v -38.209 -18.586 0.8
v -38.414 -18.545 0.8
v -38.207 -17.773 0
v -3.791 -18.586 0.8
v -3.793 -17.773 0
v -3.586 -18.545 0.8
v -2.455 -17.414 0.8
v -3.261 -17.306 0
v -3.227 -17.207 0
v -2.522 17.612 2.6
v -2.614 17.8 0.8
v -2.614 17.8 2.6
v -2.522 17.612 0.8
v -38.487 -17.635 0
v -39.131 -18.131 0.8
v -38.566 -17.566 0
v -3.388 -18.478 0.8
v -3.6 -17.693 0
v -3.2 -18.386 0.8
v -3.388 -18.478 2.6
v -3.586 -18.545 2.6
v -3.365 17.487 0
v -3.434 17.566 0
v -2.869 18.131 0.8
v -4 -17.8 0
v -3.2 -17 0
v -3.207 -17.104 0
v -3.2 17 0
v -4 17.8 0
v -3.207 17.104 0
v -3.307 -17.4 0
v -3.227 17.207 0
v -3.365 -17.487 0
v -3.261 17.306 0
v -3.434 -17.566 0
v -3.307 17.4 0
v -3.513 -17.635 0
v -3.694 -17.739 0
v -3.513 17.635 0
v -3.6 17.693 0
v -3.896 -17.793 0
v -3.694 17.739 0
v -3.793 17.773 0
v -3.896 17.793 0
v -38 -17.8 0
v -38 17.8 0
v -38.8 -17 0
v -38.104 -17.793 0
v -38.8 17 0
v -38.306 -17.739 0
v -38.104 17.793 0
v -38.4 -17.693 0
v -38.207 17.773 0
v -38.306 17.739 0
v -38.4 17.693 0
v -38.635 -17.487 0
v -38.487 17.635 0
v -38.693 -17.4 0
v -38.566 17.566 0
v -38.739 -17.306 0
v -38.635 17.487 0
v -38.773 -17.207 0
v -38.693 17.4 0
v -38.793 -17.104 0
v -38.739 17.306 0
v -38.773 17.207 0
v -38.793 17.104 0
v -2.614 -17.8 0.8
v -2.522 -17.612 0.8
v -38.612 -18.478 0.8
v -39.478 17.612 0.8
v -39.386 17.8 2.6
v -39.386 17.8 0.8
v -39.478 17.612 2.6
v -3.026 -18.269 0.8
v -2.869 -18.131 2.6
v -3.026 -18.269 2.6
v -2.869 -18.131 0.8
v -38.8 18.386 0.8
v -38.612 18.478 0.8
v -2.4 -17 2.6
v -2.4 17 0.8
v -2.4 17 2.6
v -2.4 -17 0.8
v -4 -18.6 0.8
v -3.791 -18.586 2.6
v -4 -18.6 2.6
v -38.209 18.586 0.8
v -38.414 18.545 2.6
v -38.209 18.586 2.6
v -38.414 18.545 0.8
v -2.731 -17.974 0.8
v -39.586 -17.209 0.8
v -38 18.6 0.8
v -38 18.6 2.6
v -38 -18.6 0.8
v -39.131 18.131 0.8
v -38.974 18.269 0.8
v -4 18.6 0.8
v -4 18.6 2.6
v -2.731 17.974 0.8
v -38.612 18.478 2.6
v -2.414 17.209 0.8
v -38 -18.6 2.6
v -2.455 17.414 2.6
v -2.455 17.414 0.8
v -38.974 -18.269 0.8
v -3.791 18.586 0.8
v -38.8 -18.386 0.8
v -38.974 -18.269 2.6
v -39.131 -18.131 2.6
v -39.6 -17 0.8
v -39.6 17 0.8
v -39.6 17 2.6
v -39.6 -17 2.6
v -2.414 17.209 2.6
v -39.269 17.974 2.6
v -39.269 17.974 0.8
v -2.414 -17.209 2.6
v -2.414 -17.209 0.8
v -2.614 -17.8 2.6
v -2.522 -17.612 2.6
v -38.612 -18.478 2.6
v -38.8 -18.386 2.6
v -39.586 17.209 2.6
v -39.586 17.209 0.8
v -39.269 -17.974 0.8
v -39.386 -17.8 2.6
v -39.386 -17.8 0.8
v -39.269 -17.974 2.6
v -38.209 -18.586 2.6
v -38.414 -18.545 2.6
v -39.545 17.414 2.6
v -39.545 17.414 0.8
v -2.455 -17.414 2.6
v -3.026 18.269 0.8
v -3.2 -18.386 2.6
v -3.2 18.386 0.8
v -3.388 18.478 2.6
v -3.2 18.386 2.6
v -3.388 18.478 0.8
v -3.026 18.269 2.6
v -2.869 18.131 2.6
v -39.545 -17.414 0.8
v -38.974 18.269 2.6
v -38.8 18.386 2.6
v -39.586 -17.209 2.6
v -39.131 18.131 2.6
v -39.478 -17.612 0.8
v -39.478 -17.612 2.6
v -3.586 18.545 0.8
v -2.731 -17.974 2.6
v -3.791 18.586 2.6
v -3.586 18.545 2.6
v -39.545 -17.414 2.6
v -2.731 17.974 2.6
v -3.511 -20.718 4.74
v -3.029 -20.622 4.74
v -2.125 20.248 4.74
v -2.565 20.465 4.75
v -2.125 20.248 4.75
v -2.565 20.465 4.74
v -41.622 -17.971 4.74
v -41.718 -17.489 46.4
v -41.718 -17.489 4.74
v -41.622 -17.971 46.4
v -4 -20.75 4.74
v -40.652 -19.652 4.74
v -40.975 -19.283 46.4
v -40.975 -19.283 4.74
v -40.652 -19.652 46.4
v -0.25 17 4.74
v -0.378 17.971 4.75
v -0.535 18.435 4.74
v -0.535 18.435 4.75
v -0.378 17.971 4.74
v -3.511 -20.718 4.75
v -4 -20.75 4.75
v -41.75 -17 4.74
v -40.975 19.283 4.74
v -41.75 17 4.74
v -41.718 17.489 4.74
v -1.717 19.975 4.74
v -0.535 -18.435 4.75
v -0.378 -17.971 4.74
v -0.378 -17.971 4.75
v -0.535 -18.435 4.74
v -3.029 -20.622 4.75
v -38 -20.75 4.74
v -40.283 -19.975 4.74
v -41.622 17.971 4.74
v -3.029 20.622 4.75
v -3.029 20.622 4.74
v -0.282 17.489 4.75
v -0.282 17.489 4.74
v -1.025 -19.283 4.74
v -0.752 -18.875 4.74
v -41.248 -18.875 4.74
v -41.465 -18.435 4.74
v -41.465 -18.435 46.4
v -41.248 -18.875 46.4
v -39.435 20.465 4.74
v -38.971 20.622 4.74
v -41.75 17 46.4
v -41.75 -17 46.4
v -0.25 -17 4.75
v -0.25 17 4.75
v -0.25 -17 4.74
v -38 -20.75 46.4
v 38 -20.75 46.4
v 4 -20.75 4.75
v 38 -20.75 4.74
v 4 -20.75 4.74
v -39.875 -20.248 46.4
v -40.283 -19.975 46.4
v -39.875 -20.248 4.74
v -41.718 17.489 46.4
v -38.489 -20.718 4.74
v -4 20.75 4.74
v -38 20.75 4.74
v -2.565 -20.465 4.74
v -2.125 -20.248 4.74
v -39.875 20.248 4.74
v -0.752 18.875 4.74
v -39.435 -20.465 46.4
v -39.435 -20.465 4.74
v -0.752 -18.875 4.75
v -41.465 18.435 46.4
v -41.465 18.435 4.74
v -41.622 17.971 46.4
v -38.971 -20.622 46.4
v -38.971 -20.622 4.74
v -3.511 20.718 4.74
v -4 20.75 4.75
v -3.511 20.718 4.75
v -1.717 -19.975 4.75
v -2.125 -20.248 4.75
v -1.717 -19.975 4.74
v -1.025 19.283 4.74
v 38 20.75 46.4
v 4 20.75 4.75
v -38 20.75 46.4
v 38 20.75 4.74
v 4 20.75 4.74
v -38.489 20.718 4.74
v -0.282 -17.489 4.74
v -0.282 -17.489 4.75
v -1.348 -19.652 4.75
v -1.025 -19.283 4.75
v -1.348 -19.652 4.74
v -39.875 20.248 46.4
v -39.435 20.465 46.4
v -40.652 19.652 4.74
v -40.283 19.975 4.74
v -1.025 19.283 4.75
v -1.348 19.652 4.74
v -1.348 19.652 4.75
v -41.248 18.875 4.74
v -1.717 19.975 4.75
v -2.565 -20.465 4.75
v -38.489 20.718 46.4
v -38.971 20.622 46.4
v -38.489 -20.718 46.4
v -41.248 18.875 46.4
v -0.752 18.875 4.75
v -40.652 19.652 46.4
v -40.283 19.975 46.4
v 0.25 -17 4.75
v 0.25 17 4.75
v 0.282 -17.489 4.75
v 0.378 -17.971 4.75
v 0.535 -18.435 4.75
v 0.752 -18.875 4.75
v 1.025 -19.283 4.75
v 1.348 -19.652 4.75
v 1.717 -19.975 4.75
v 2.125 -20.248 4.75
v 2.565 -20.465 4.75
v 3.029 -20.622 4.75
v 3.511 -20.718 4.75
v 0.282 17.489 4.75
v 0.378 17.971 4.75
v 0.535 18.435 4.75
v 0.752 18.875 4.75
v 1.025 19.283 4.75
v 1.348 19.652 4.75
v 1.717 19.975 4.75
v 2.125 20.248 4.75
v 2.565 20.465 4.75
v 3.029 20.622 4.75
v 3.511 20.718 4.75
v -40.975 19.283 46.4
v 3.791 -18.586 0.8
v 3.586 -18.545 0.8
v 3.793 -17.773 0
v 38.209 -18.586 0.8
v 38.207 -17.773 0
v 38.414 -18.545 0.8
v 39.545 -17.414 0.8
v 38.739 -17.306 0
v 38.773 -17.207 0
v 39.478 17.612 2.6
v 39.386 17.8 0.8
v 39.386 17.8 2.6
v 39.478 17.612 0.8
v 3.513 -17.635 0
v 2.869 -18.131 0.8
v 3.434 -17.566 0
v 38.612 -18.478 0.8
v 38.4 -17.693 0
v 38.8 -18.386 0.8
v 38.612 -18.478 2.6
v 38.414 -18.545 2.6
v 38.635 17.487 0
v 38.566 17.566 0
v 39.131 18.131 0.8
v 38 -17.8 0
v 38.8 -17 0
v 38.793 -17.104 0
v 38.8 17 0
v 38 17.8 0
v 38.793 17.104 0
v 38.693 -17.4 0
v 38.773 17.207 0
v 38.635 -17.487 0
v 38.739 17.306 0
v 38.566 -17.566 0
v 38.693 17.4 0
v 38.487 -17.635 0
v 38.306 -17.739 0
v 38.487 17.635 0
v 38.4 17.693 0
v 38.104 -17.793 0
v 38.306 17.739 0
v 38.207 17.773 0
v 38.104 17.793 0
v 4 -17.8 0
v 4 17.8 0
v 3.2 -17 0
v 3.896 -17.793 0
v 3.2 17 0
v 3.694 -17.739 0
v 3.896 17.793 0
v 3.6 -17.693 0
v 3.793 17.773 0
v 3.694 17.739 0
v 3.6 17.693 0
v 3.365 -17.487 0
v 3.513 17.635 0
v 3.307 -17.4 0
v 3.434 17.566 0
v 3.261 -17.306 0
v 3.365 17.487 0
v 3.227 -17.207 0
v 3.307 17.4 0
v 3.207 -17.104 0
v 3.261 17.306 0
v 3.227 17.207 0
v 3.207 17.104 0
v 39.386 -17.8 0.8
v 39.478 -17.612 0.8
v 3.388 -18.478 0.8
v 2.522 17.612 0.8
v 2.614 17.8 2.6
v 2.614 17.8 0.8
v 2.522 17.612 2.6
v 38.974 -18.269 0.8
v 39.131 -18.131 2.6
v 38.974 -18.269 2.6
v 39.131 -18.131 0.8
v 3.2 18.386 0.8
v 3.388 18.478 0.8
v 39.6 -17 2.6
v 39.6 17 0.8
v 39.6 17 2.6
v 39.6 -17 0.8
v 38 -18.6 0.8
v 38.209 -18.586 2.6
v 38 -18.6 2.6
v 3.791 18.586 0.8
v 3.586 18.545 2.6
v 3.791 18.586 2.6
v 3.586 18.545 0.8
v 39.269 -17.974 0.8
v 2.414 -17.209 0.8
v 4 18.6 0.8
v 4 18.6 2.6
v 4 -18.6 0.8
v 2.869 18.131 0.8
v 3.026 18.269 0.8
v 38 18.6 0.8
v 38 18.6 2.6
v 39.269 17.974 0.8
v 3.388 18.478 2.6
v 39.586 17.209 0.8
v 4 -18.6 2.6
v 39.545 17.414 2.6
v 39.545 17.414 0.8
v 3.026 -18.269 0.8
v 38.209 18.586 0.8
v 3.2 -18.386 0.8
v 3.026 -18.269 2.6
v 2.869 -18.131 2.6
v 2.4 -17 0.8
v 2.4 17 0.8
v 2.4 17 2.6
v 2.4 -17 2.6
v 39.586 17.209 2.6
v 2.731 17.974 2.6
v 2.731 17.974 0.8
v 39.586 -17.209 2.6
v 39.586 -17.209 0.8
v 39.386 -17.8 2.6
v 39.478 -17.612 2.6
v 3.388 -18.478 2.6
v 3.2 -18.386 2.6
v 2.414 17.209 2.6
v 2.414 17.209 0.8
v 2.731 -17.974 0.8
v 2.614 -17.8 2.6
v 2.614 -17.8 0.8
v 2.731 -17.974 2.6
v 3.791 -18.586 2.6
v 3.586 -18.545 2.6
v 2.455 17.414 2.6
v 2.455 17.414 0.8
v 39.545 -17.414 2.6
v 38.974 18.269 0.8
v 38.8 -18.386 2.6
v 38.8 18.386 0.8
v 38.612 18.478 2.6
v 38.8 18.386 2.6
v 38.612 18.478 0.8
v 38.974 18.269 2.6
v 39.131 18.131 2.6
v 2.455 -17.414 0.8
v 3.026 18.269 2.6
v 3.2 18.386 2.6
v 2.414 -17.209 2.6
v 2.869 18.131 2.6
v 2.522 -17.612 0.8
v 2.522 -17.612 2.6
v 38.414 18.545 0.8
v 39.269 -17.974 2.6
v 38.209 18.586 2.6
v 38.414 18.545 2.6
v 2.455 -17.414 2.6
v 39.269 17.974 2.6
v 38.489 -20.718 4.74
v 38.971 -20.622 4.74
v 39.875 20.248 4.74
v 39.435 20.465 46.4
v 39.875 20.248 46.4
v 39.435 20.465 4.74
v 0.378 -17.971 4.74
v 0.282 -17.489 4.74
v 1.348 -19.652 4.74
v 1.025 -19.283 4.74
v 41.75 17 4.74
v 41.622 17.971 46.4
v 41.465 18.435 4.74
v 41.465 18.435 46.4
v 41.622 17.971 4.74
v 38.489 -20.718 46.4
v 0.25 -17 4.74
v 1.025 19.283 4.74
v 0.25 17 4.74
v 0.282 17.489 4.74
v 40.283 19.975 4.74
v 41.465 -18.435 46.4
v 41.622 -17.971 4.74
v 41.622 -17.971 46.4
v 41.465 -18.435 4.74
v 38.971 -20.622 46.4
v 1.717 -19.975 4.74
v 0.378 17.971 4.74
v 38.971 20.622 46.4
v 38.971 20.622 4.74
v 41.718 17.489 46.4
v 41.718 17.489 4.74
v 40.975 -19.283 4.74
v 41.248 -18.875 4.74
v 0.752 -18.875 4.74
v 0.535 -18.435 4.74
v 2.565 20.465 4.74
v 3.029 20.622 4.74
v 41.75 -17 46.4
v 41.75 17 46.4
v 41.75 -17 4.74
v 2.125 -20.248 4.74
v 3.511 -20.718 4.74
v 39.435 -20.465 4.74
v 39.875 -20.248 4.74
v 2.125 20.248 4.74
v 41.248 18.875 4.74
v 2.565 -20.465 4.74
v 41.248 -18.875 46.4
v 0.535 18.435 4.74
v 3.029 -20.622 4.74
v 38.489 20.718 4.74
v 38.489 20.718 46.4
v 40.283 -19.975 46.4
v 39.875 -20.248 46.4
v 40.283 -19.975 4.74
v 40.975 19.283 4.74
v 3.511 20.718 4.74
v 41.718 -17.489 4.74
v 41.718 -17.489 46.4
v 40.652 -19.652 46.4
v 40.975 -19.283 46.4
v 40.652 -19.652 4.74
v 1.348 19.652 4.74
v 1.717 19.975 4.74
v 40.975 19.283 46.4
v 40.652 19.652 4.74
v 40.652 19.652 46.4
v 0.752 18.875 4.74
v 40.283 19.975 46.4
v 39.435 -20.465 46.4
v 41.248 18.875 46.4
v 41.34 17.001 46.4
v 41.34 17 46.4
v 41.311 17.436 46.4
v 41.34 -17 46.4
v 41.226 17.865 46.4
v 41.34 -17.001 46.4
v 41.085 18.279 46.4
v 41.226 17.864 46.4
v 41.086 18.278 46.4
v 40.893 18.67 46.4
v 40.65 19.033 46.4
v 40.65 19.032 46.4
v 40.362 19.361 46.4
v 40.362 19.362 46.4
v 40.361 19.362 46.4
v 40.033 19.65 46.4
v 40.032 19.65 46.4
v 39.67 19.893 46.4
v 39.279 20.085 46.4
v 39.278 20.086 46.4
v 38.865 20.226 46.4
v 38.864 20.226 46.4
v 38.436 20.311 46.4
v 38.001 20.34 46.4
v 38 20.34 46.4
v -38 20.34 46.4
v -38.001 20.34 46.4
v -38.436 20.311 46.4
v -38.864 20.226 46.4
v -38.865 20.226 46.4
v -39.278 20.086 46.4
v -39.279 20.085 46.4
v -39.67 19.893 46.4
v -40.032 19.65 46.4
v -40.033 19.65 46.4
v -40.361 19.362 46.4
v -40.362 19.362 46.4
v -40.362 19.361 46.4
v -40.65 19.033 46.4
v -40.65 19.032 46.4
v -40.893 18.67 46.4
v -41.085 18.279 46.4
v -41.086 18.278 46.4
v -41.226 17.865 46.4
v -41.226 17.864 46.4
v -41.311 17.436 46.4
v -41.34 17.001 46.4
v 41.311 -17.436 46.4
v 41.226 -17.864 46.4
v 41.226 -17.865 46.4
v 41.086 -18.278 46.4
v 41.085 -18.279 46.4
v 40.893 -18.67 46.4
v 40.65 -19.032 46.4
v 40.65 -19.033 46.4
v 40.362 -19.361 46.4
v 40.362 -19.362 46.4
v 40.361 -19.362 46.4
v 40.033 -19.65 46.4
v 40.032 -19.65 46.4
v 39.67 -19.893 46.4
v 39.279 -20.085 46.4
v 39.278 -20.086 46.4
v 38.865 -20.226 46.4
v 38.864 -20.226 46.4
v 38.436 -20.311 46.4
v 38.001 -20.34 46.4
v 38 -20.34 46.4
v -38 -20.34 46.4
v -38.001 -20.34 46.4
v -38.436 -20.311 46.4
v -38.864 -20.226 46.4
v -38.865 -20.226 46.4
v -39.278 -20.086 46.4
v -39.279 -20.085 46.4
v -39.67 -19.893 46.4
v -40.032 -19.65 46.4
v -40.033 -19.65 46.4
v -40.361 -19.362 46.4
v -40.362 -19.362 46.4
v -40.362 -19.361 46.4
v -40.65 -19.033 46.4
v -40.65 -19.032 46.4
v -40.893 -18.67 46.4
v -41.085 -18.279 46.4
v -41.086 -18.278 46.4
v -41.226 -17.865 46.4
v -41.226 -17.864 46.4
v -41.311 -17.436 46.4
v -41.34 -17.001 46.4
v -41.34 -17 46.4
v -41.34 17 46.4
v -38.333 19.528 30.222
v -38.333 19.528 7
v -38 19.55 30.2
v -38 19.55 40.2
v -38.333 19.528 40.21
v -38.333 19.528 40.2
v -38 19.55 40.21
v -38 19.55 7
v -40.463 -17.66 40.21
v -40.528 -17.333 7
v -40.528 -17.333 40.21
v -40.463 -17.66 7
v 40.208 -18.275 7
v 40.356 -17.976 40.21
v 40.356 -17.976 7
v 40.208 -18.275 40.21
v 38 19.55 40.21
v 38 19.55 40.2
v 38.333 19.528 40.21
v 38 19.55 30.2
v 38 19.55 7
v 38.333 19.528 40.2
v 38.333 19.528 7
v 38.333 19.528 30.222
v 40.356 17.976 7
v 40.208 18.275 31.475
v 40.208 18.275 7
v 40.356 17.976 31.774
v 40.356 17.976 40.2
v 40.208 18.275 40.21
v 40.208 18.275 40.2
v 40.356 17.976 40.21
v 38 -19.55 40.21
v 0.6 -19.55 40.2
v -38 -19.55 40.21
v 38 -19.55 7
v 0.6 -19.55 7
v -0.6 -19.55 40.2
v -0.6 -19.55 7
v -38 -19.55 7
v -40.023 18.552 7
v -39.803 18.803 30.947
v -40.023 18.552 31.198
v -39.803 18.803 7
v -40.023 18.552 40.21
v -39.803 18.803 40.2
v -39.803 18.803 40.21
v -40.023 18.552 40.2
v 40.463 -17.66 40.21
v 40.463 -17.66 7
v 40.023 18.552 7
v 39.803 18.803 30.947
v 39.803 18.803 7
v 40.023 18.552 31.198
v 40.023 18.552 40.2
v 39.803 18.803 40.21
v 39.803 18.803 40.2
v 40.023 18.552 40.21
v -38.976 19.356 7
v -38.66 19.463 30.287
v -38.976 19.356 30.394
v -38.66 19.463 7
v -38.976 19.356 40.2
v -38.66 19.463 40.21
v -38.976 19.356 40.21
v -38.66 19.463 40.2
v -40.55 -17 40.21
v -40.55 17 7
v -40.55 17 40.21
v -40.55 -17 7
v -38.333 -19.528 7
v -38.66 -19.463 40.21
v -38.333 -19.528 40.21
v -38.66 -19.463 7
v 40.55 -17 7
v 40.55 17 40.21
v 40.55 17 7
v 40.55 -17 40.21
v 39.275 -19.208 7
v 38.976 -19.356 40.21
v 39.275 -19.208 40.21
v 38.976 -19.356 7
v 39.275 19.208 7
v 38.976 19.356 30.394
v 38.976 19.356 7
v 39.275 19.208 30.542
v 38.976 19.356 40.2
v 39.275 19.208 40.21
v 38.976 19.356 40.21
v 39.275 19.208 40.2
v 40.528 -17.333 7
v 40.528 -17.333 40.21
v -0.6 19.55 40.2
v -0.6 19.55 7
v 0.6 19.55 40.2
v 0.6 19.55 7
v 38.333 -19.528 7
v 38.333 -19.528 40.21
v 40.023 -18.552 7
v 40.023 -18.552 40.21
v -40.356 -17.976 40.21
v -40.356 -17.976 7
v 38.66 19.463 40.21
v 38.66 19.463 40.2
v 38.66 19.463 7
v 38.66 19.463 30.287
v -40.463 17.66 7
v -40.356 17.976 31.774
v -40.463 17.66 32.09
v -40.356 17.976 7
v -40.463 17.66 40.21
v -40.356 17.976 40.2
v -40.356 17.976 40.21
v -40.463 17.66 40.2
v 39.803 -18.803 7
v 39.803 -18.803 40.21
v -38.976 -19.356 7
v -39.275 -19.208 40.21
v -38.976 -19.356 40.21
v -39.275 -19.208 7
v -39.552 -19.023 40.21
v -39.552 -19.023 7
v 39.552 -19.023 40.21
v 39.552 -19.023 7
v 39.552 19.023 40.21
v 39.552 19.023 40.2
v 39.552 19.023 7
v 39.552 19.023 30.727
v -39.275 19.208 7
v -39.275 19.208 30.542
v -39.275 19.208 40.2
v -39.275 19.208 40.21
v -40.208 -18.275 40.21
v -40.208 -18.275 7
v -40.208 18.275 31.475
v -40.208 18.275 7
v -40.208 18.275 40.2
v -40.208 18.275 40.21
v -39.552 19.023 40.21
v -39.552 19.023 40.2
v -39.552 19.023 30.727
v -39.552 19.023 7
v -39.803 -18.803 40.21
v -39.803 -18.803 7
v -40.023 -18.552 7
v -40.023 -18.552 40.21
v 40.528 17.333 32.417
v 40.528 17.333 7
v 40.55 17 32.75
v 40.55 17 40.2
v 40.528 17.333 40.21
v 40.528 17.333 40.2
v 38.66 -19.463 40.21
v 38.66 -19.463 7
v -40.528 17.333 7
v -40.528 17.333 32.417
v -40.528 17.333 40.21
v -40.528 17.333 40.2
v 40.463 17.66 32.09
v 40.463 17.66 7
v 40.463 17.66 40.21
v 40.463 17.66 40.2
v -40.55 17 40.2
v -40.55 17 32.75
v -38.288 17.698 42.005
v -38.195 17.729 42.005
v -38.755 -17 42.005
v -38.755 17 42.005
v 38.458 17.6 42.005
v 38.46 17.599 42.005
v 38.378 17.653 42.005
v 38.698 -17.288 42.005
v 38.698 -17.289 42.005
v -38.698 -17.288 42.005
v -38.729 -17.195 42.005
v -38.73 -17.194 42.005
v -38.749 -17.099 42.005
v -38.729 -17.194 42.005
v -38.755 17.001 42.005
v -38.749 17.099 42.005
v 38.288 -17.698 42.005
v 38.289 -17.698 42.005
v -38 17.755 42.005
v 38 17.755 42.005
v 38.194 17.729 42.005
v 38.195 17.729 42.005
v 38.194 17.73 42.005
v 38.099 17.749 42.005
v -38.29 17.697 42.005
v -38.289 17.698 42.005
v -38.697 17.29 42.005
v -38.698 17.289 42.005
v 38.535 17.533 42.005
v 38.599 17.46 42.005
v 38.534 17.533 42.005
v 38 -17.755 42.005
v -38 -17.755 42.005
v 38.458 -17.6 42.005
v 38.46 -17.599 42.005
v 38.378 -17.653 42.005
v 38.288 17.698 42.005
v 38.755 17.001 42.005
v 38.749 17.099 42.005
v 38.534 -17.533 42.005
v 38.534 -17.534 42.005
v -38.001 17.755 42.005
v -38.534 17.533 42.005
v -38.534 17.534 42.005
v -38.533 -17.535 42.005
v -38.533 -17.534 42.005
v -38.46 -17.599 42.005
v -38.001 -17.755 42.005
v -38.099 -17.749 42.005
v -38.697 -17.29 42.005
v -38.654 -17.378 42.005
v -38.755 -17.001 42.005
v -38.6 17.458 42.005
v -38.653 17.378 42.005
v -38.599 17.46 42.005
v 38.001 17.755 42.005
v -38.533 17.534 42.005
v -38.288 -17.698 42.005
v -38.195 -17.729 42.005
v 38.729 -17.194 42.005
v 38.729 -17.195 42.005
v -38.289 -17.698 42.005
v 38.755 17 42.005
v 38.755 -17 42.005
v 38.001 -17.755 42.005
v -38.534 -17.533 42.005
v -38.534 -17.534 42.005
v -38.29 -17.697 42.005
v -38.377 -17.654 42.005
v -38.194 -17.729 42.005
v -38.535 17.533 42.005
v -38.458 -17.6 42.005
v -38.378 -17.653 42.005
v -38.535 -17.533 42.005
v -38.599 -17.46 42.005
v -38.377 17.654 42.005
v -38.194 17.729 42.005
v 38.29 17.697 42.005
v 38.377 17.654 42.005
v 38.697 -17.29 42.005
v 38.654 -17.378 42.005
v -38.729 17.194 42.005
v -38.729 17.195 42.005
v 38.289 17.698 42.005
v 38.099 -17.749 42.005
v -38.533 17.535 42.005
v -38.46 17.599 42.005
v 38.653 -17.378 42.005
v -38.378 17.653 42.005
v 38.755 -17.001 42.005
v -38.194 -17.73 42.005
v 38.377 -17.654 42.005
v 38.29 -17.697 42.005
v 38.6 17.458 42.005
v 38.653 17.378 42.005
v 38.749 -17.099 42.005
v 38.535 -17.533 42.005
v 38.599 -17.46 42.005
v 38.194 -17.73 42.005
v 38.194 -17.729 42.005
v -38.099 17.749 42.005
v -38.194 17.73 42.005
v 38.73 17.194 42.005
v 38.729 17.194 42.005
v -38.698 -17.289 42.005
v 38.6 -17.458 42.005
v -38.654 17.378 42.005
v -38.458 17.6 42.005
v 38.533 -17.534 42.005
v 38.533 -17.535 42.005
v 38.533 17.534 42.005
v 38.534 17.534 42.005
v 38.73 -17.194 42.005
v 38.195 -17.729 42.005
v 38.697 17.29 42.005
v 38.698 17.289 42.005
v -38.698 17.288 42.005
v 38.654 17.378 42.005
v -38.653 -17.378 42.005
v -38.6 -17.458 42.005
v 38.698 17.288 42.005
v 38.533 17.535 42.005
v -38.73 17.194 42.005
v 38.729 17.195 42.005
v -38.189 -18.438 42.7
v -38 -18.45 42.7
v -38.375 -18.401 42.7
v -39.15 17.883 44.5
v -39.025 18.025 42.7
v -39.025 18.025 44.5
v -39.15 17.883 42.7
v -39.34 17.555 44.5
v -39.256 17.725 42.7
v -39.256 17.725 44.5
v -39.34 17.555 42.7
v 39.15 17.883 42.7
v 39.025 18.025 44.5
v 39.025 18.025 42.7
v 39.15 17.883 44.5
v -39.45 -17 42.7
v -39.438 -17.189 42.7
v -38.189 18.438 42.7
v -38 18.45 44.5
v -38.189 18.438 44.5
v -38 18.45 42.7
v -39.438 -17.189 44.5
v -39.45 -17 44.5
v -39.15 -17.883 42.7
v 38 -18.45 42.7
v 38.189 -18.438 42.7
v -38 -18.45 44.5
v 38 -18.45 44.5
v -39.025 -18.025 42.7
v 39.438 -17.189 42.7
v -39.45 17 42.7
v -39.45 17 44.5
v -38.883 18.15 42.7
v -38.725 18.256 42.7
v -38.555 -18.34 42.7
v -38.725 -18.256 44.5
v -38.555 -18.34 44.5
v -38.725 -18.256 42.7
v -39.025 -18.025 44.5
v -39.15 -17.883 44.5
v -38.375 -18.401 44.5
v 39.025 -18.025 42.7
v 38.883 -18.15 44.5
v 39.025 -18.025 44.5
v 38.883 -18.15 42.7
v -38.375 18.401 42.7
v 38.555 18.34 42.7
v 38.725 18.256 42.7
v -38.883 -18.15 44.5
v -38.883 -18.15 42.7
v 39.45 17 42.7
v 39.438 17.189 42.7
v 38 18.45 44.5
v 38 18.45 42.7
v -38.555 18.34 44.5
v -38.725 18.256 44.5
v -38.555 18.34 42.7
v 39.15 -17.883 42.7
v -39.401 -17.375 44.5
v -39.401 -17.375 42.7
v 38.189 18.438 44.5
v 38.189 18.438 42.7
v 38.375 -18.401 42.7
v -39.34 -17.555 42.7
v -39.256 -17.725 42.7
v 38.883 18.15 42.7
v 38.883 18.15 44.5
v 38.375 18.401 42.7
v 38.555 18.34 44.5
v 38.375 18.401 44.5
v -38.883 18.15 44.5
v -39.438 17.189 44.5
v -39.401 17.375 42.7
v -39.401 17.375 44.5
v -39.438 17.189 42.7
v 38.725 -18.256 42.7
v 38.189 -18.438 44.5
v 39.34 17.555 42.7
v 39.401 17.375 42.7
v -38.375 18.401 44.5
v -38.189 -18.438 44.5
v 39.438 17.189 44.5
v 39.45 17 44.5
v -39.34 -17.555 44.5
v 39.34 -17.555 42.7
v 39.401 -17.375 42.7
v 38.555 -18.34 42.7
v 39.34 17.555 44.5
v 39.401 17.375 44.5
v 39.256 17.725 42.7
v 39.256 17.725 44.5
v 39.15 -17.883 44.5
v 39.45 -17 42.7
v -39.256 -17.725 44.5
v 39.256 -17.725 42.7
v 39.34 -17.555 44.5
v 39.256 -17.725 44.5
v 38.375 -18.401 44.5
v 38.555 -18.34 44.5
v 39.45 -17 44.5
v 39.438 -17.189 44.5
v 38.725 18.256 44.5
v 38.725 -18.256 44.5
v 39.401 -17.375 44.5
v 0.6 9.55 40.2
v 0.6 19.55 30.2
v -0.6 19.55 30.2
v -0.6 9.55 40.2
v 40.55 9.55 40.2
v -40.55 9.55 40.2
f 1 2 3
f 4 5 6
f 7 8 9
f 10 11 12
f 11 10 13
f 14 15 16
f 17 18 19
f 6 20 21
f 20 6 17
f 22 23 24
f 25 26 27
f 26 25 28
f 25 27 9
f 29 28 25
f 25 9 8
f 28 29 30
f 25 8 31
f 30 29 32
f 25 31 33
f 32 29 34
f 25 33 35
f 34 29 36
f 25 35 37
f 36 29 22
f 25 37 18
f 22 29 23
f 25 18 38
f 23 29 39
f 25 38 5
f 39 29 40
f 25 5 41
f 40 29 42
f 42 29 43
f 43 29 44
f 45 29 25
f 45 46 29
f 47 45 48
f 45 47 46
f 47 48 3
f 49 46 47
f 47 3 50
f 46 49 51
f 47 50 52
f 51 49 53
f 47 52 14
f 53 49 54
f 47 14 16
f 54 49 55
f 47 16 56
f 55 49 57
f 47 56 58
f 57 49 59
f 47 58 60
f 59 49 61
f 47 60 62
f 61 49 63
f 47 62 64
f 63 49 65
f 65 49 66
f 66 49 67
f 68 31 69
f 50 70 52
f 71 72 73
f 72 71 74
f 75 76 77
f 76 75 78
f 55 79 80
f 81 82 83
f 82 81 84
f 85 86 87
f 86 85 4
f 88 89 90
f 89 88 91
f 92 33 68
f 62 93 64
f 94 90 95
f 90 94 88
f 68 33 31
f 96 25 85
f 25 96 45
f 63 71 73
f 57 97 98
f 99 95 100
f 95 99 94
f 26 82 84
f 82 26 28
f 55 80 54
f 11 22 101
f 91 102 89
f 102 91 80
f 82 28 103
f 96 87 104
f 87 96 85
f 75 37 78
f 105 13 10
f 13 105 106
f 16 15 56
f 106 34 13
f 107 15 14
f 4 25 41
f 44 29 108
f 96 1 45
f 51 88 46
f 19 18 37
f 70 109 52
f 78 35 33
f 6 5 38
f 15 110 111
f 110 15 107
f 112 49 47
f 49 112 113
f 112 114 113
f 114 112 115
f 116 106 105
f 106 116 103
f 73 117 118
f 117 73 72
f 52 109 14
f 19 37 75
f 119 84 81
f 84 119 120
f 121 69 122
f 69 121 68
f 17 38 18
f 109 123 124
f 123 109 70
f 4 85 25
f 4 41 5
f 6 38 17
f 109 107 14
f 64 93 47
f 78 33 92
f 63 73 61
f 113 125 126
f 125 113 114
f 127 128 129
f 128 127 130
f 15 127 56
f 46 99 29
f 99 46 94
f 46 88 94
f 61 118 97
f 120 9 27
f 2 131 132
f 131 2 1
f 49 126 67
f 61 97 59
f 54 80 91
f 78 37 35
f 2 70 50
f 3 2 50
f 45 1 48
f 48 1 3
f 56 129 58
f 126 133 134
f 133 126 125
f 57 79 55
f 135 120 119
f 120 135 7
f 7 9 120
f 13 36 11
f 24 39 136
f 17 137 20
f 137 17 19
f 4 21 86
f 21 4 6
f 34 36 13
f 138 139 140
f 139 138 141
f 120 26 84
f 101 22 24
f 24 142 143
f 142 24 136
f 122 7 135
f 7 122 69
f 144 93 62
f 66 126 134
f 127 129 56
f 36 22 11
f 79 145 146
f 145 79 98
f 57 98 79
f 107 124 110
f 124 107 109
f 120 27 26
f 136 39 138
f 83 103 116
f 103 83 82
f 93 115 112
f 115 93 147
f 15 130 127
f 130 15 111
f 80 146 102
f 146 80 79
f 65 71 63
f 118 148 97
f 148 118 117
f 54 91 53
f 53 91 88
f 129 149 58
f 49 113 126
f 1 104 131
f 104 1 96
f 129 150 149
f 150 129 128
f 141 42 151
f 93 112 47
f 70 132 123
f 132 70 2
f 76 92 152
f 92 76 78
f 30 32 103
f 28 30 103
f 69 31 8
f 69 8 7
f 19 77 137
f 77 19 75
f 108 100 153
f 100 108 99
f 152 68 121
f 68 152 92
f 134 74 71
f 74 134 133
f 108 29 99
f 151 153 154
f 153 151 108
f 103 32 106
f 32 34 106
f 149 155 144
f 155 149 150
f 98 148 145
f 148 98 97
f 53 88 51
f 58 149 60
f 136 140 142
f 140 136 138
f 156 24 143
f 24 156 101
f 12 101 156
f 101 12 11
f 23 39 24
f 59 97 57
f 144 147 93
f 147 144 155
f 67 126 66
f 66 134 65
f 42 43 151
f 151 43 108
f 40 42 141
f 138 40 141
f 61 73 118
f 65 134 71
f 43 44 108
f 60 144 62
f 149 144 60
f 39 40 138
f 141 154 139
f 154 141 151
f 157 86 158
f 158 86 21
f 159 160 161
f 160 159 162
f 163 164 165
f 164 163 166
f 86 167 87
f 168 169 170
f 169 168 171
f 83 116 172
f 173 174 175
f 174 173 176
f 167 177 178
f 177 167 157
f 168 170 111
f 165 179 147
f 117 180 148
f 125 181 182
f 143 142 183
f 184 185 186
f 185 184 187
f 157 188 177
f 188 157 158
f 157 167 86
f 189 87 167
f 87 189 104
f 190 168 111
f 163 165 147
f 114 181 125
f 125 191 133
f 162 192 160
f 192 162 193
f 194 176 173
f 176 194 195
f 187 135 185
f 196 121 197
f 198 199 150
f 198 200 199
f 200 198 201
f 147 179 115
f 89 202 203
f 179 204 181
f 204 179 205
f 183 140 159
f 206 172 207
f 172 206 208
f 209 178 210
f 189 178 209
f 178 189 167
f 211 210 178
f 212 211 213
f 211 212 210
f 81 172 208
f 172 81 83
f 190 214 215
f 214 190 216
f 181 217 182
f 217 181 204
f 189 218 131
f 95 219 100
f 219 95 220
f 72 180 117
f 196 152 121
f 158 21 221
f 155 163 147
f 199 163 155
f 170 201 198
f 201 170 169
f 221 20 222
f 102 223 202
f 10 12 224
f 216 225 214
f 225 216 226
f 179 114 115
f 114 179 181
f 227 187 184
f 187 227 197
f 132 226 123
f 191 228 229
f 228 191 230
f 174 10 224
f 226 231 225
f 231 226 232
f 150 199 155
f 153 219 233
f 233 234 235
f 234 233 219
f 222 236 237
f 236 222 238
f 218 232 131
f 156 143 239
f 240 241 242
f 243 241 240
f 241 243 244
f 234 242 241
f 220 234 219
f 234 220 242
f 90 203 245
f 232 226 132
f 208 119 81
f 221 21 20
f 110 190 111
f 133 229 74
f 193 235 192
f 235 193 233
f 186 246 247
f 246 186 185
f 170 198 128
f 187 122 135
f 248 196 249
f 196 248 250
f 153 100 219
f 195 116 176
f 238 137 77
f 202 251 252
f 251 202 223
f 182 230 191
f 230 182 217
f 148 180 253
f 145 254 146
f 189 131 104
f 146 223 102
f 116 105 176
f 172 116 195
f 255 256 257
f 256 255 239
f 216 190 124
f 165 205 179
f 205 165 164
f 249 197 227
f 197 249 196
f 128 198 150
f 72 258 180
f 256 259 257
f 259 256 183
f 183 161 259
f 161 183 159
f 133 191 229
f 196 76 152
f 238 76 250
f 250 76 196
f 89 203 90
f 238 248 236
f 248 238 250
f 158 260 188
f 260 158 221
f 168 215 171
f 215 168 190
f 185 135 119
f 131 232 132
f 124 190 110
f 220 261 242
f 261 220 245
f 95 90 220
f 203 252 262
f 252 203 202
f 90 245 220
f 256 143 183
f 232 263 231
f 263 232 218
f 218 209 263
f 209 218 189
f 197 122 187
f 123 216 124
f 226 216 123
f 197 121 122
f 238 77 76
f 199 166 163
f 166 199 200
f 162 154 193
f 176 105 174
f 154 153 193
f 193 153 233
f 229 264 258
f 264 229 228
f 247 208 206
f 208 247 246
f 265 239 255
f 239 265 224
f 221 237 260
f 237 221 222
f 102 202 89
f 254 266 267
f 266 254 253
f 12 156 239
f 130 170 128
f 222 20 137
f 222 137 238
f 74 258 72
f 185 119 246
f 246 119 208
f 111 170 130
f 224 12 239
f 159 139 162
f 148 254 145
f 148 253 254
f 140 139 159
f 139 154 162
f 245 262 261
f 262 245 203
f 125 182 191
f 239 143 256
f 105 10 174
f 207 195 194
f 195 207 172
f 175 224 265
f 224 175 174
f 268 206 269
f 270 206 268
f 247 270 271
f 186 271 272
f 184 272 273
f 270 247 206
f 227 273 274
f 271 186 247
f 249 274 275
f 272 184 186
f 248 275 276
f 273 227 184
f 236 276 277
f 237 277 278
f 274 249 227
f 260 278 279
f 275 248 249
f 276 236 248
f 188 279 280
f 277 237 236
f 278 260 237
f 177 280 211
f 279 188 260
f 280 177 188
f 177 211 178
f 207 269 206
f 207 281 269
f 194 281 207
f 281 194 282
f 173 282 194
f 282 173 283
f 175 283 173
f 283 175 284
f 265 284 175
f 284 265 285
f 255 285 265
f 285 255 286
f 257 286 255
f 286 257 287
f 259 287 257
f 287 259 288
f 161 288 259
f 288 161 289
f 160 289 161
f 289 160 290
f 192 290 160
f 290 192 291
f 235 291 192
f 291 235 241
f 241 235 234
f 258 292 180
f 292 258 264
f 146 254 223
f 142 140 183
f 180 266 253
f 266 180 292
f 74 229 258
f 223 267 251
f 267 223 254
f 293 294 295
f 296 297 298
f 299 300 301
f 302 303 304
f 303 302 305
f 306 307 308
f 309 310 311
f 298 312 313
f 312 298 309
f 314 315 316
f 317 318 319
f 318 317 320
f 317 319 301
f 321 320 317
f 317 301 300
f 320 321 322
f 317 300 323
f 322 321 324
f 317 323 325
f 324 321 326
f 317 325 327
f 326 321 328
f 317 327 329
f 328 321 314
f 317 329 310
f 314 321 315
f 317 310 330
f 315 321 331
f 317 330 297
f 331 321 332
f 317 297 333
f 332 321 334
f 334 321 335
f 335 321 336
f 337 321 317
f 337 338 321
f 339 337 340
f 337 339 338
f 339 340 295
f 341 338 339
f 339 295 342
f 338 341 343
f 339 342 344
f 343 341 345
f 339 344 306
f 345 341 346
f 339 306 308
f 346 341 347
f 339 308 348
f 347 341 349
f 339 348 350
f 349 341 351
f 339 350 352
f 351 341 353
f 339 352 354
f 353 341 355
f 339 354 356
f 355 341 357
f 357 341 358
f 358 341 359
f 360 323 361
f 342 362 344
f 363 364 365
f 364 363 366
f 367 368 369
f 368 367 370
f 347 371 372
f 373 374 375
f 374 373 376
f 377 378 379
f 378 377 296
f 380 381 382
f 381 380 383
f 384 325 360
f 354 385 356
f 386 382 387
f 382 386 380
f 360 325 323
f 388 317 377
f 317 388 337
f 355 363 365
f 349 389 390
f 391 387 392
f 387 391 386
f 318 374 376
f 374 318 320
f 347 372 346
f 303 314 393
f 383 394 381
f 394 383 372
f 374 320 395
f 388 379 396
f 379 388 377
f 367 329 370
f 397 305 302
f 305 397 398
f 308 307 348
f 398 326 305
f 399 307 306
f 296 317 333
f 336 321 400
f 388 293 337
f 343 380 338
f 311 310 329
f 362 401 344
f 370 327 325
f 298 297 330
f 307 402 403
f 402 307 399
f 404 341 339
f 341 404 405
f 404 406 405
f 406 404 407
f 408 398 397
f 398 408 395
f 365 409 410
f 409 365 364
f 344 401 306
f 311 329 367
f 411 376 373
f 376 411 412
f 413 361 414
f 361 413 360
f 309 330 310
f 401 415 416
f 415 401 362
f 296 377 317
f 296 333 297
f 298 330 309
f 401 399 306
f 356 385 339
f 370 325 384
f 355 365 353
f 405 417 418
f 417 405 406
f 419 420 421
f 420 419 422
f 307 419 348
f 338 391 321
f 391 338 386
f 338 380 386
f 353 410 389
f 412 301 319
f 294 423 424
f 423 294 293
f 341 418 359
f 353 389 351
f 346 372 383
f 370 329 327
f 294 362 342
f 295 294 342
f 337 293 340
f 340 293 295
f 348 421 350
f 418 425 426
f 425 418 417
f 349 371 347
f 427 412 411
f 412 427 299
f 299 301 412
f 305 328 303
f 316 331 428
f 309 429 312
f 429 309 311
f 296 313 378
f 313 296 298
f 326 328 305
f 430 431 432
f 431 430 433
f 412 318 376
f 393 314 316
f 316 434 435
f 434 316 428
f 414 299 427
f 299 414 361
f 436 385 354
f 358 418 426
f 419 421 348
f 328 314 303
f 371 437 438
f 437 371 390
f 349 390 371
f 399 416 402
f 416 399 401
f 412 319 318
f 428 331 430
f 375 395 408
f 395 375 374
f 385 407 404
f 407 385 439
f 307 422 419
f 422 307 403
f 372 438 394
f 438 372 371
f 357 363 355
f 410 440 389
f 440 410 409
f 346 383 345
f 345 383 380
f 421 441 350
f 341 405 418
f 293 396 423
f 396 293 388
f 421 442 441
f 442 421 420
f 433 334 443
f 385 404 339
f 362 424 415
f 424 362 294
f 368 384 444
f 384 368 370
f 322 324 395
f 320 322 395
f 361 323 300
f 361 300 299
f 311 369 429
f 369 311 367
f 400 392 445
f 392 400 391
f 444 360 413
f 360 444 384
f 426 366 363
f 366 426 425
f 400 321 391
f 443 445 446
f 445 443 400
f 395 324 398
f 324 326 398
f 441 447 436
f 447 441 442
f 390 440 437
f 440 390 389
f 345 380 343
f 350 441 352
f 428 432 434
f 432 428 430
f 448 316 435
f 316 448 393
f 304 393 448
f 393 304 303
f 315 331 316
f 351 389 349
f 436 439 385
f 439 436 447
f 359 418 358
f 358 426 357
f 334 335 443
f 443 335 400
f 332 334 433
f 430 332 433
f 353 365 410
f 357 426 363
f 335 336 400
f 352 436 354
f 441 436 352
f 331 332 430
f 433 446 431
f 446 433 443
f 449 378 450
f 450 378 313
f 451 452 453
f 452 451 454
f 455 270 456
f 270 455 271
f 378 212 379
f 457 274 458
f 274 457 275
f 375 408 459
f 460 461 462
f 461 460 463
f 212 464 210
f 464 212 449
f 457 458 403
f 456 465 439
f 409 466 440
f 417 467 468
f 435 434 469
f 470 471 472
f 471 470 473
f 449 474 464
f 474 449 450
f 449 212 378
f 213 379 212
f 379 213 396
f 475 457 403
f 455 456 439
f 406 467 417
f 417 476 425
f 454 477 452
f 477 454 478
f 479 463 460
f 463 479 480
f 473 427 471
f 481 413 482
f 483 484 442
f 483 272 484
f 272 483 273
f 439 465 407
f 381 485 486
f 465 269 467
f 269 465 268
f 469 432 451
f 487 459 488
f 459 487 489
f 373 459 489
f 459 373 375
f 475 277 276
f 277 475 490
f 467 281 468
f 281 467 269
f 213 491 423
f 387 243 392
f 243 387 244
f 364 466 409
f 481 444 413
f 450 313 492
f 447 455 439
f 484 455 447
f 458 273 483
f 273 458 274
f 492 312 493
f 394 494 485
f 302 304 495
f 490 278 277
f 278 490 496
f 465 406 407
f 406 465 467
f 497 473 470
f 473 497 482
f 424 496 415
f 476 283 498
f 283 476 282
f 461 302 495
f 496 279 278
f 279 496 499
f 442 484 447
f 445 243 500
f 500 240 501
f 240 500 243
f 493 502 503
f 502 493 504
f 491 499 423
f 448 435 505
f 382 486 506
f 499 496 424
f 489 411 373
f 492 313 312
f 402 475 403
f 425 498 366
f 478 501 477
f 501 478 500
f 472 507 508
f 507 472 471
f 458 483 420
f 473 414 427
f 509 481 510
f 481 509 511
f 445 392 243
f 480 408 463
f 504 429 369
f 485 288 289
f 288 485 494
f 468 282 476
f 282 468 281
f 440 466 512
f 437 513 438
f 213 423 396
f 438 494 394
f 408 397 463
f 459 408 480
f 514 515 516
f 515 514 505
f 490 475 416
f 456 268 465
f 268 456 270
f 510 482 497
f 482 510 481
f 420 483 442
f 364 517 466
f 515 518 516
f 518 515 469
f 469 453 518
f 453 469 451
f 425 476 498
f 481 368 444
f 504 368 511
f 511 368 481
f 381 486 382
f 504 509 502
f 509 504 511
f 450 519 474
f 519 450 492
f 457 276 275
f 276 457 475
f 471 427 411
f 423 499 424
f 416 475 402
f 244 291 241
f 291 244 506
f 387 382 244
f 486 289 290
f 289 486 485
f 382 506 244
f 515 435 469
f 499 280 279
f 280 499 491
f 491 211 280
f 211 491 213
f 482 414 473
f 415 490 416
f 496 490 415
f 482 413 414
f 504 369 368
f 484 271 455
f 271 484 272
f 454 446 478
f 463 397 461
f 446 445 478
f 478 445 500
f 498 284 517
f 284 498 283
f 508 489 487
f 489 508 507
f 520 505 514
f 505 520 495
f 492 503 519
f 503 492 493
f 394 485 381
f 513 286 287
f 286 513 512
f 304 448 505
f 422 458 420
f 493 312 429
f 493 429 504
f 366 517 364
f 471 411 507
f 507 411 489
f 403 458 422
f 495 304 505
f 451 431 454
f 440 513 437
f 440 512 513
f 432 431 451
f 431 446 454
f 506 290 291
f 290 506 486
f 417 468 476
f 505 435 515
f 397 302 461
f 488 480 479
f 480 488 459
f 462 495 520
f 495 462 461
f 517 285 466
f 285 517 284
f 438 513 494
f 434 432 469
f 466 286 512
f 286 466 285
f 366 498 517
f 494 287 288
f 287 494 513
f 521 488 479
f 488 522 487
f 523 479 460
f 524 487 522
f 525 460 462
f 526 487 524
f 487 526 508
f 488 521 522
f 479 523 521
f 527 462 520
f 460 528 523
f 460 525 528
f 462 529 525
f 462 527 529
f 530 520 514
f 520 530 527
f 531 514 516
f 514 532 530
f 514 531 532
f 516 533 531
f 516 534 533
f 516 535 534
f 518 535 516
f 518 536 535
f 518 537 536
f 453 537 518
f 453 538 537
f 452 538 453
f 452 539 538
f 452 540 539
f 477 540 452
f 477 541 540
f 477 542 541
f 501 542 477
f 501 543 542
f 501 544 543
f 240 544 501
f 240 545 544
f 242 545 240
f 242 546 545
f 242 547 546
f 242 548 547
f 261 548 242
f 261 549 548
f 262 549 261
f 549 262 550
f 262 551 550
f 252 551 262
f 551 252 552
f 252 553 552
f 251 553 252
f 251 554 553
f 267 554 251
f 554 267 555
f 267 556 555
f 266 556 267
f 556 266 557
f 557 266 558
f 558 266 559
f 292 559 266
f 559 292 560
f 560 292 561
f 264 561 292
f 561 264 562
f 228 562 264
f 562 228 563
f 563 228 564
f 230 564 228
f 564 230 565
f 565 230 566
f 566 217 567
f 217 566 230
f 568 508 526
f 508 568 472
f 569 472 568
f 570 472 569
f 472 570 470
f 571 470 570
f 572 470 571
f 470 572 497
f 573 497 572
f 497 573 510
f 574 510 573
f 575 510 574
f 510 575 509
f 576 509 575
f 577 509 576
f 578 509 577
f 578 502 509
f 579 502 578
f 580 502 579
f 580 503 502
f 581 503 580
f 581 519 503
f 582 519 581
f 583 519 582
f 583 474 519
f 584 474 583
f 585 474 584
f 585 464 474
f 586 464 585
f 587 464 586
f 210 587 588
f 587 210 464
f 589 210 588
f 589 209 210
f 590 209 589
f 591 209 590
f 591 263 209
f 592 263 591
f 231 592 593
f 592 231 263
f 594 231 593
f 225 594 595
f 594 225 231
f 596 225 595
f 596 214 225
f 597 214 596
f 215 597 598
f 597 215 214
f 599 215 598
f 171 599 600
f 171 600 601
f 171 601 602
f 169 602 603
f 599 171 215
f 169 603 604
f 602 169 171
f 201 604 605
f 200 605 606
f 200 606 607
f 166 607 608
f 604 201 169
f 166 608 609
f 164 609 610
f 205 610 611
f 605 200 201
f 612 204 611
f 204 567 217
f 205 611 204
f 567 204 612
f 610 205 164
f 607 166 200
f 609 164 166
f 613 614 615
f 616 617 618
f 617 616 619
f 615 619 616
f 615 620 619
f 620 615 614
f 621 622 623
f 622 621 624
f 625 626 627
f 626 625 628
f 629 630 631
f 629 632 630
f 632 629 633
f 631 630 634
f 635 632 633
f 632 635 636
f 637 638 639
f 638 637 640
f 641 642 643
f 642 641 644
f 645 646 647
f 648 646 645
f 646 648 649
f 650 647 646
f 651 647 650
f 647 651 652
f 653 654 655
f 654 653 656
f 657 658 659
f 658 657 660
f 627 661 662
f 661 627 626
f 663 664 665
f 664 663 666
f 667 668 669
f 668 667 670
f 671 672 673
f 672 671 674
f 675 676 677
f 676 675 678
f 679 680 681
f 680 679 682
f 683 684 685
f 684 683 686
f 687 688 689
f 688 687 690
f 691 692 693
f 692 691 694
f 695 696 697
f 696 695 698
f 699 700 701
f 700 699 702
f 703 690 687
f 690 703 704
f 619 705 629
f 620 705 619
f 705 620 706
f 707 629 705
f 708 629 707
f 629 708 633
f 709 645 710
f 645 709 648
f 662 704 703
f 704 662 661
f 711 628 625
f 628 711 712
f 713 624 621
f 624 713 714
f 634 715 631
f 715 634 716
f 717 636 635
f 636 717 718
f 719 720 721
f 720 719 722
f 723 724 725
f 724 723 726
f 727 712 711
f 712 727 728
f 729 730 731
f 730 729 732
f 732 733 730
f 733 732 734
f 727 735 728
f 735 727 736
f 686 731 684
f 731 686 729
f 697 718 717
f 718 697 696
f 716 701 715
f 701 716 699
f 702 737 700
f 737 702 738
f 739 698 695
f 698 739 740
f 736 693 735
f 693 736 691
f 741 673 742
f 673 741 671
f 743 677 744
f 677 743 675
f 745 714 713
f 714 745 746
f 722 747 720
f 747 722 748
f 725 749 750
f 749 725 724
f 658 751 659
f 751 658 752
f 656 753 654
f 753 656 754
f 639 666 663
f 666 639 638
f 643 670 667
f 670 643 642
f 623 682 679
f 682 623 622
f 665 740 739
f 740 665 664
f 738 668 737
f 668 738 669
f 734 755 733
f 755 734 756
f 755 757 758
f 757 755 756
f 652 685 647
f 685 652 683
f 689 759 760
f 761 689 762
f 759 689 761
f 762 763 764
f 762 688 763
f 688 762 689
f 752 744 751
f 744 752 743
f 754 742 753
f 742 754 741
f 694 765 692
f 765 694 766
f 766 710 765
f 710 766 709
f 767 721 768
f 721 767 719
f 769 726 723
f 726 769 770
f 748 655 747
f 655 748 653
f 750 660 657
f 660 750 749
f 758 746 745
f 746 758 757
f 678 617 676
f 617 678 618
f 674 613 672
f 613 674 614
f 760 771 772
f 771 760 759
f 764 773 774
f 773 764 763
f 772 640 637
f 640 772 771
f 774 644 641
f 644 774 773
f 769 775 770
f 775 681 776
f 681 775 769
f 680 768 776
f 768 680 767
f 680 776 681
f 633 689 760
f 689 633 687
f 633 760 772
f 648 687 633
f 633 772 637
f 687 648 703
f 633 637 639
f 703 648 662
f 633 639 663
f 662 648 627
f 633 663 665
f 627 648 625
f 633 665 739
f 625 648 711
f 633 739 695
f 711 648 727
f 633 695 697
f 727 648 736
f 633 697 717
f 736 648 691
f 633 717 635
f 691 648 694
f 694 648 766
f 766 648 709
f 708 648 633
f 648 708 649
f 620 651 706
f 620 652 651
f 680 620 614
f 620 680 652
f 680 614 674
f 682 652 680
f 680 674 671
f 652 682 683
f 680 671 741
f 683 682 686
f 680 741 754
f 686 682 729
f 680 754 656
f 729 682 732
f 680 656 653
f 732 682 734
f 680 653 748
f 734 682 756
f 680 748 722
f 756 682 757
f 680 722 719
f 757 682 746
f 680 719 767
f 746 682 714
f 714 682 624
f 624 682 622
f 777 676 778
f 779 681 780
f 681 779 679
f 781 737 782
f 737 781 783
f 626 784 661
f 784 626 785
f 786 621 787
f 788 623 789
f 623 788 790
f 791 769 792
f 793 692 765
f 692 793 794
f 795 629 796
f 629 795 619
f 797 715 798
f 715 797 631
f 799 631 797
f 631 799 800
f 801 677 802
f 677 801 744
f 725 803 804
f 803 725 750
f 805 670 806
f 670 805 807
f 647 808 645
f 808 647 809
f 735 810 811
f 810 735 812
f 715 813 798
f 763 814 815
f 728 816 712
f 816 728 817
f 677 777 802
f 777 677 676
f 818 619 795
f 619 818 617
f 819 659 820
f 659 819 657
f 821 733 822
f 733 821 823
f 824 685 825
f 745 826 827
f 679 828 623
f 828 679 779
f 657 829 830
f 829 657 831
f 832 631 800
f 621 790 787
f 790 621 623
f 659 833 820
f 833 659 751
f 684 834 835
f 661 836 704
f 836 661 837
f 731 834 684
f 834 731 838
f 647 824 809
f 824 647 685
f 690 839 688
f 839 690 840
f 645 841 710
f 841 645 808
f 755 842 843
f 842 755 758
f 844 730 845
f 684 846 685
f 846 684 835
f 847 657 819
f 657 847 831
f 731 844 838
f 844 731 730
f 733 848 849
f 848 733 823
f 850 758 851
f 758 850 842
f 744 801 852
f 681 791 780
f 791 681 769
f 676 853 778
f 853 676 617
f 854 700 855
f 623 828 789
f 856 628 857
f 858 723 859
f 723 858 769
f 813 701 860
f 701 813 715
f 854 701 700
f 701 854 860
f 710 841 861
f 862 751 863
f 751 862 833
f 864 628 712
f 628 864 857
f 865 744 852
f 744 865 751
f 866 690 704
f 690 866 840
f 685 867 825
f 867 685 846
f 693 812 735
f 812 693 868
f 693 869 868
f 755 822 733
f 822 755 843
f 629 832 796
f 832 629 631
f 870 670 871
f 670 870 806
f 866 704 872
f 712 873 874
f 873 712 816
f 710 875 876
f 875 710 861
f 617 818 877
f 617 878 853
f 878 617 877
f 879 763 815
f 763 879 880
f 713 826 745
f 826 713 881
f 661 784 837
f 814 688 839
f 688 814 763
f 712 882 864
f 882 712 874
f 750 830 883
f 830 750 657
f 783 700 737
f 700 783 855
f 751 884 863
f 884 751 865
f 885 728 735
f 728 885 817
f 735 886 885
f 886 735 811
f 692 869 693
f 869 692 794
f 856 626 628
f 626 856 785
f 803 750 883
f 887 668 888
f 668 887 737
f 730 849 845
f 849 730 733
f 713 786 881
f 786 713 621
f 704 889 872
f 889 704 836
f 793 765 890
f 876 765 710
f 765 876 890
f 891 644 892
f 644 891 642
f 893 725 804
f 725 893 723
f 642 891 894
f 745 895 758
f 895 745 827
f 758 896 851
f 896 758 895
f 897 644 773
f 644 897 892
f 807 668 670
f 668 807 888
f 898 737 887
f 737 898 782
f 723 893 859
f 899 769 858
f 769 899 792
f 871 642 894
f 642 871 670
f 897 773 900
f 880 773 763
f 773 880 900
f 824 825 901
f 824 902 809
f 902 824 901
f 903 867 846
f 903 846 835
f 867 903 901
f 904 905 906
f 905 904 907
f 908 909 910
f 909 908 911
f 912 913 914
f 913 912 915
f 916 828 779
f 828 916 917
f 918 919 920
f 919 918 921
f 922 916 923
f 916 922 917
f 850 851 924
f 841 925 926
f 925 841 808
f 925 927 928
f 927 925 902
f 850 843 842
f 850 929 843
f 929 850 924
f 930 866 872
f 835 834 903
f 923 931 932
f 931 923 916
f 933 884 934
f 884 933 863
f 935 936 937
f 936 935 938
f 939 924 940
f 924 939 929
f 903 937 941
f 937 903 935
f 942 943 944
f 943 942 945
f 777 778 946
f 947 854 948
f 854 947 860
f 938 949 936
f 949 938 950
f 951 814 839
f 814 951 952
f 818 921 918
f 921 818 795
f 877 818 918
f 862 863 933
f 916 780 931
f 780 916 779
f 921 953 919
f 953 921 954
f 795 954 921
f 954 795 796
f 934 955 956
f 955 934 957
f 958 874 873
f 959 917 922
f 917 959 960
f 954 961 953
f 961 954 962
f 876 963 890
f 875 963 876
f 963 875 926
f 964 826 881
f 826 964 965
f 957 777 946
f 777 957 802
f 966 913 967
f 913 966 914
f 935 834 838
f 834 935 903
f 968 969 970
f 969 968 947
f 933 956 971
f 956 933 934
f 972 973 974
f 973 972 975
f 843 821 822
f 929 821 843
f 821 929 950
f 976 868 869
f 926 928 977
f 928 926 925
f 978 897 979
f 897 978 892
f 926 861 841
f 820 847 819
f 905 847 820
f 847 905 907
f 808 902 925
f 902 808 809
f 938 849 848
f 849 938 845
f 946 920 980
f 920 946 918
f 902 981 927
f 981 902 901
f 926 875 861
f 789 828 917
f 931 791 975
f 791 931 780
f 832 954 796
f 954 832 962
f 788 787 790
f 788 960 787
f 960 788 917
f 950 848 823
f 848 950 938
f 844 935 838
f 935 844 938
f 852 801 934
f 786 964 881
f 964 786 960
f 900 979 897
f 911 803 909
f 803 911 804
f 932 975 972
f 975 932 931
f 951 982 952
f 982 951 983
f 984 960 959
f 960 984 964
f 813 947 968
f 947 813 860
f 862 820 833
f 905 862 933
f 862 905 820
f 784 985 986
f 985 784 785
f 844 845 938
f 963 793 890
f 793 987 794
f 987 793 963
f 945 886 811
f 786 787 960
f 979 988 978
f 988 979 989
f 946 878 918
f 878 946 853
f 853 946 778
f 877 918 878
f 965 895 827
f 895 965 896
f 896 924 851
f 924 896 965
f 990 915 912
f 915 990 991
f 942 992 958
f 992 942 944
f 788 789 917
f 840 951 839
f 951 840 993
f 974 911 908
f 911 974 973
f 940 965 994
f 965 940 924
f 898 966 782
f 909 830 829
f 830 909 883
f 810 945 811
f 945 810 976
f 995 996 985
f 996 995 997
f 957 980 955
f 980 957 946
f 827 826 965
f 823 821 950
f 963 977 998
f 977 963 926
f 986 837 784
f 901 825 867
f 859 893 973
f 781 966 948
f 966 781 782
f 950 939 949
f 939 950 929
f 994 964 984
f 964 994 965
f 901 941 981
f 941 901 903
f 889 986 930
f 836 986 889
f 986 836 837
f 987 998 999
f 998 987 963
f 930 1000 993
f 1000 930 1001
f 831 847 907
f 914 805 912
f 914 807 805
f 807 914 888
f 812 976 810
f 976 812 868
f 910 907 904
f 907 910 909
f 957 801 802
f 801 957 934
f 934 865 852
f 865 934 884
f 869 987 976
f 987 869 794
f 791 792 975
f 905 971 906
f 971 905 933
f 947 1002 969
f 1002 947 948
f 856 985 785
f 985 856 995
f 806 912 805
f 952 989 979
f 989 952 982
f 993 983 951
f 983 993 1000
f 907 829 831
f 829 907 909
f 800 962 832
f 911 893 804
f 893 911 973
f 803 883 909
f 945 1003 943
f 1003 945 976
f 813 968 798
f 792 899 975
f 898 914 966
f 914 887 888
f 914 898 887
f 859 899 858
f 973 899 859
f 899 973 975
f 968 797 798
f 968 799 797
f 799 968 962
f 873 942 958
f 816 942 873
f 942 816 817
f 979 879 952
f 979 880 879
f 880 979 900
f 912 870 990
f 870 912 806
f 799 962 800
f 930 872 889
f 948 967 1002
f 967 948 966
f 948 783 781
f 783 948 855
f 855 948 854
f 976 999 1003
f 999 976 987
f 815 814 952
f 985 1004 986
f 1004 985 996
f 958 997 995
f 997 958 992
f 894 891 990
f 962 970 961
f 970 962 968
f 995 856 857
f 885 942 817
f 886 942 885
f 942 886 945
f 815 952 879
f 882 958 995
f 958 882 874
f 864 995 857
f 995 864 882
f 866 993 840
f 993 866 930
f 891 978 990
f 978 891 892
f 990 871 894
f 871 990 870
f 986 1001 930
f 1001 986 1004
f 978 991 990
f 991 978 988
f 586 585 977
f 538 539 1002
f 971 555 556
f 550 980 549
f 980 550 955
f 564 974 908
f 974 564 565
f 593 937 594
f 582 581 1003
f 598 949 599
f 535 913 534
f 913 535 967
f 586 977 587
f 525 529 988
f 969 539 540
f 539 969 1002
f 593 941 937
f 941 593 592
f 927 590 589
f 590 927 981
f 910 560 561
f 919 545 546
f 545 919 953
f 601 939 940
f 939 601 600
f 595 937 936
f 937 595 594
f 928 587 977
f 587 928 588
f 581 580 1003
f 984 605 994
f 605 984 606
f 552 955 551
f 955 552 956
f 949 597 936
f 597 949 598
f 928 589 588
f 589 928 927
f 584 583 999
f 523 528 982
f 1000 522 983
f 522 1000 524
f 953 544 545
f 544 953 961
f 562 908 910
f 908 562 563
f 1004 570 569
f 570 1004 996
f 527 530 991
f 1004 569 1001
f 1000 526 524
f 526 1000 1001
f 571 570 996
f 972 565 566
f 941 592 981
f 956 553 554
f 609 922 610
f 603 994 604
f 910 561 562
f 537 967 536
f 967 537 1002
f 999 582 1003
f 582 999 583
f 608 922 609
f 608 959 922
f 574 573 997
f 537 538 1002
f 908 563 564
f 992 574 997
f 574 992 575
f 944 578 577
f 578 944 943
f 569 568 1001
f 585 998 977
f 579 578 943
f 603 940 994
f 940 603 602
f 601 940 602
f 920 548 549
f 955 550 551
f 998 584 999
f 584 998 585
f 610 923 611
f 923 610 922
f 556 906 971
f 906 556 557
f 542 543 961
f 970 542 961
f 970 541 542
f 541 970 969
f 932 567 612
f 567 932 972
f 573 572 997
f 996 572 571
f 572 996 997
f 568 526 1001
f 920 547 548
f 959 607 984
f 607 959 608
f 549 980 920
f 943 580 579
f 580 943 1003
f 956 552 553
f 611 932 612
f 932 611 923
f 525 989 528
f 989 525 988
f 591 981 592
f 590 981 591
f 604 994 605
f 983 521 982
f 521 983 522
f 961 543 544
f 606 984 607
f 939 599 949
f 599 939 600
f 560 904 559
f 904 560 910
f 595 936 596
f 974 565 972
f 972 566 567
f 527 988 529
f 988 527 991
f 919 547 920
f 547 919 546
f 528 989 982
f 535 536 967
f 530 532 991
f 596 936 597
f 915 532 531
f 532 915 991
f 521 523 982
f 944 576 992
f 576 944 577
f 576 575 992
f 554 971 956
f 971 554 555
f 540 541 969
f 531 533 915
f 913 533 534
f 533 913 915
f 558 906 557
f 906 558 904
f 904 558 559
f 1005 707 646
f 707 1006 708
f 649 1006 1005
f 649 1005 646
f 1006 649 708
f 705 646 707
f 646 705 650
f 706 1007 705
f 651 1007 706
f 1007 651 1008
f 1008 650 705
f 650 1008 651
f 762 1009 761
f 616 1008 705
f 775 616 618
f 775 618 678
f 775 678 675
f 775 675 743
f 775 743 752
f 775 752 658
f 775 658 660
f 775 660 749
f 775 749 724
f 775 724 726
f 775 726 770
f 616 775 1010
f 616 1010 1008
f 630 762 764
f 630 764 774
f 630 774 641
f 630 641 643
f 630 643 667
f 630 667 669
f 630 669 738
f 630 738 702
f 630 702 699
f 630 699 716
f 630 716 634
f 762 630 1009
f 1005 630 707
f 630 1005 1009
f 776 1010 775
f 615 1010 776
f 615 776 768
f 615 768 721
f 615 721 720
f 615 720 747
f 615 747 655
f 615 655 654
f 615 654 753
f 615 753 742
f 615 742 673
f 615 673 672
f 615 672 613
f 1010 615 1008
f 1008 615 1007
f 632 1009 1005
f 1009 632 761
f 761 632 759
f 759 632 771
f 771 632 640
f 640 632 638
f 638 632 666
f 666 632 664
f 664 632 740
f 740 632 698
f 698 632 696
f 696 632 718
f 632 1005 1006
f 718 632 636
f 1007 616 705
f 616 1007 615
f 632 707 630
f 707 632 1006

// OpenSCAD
// Gridfinity bin 2 x 1 x 6 units, stacking lip, label shelf, one divider.
pitch = 42;
gx = 2;
gy = 1;
hu = 6;
H = 7 * hu;              // 42 mm, top of the wall below the lip
W = gx * pitch - 0.5;    // 83.5
D = gy * pitch - 0.5;    // 41.5
R = 3.75;                // outer corner radius
wall = 1.2;
floor_top = 7;           // inside floor height
lip_h = 4.4;
$fn = 48;

module rr(w, d, r, h = 0.01) {
    rr_ = max(r, 0.3);
    linear_extrude(h) offset(rr_) square([w - 2 * rr_, d - 2 * rr_], center = true);
}

// one base foot, standard profile: 0.8 chamfer, 1.8 straight, 2.15 chamfer (4.75 total)
module foot() {
    hull() {
        rr(35.6, 35.6, 0.8);
        translate([0, 0, 0.8]) rr(37.2, 37.2, 1.6);
    }
    hull() {
        translate([0, 0, 0.8]) rr(37.2, 37.2, 1.6);
        translate([0, 0, 2.6]) rr(37.2, 37.2, 1.6);
    }
    hull() {
        translate([0, 0, 2.6]) rr(37.2, 37.2, 1.6);
        translate([0, 0, 4.75 - 0.01]) rr(41.5, 41.5, R);
    }
}

// inside cavity at inset i from the outer wall
module slice(i, z) { translate([0, 0, z]) rr(W - 2 * i, D - 2 * i, R - i); }

union() {
    for (x = [0:gx - 1], y = [0:gy - 1])
        translate([(x - (gx - 1) / 2) * pitch, (y - (gy - 1) / 2) * pitch, 0]) foot();

    difference() {
        translate([0, 0, 4.75]) rr(W, D, R, H + lip_h - 4.75);
        // main cavity
        hull() { slice(wall, floor_top); slice(wall, H - 1.8); }
        // support chamfer under the lip
        hull() { slice(wall, H - 1.8); slice(3.0, H); }
        // lip profile: 0.7 chamfer, 1.8 straight, 1.9 chamfer to a 0.4 top edge
        hull() { slice(3.0, H); slice(2.3, H + 0.7); }
        hull() { slice(2.3, H + 0.7); slice(2.3, H + 2.5); }
        hull() { slice(2.3, H + 2.5); slice(0.4, H + lip_h + 0.01); }
    }

    // divider across the middle
    translate([-wall / 2, -D / 2 + 1, floor_top]) cube([wall, D - 2, H - floor_top - 1.8]);

    // label shelf on the back wall, 45 degree underside
    shelf = 10;
    yb = D / 2 - wall;
    translate([W / 2 - wall, 0, 0]) rotate([0, -90, 0])
        linear_extrude(W - 2 * wall)
            polygon([[H - 1.8, yb], [H - 1.8, yb - shelf], [H - 1.8 - shelf, yb]]);
}
